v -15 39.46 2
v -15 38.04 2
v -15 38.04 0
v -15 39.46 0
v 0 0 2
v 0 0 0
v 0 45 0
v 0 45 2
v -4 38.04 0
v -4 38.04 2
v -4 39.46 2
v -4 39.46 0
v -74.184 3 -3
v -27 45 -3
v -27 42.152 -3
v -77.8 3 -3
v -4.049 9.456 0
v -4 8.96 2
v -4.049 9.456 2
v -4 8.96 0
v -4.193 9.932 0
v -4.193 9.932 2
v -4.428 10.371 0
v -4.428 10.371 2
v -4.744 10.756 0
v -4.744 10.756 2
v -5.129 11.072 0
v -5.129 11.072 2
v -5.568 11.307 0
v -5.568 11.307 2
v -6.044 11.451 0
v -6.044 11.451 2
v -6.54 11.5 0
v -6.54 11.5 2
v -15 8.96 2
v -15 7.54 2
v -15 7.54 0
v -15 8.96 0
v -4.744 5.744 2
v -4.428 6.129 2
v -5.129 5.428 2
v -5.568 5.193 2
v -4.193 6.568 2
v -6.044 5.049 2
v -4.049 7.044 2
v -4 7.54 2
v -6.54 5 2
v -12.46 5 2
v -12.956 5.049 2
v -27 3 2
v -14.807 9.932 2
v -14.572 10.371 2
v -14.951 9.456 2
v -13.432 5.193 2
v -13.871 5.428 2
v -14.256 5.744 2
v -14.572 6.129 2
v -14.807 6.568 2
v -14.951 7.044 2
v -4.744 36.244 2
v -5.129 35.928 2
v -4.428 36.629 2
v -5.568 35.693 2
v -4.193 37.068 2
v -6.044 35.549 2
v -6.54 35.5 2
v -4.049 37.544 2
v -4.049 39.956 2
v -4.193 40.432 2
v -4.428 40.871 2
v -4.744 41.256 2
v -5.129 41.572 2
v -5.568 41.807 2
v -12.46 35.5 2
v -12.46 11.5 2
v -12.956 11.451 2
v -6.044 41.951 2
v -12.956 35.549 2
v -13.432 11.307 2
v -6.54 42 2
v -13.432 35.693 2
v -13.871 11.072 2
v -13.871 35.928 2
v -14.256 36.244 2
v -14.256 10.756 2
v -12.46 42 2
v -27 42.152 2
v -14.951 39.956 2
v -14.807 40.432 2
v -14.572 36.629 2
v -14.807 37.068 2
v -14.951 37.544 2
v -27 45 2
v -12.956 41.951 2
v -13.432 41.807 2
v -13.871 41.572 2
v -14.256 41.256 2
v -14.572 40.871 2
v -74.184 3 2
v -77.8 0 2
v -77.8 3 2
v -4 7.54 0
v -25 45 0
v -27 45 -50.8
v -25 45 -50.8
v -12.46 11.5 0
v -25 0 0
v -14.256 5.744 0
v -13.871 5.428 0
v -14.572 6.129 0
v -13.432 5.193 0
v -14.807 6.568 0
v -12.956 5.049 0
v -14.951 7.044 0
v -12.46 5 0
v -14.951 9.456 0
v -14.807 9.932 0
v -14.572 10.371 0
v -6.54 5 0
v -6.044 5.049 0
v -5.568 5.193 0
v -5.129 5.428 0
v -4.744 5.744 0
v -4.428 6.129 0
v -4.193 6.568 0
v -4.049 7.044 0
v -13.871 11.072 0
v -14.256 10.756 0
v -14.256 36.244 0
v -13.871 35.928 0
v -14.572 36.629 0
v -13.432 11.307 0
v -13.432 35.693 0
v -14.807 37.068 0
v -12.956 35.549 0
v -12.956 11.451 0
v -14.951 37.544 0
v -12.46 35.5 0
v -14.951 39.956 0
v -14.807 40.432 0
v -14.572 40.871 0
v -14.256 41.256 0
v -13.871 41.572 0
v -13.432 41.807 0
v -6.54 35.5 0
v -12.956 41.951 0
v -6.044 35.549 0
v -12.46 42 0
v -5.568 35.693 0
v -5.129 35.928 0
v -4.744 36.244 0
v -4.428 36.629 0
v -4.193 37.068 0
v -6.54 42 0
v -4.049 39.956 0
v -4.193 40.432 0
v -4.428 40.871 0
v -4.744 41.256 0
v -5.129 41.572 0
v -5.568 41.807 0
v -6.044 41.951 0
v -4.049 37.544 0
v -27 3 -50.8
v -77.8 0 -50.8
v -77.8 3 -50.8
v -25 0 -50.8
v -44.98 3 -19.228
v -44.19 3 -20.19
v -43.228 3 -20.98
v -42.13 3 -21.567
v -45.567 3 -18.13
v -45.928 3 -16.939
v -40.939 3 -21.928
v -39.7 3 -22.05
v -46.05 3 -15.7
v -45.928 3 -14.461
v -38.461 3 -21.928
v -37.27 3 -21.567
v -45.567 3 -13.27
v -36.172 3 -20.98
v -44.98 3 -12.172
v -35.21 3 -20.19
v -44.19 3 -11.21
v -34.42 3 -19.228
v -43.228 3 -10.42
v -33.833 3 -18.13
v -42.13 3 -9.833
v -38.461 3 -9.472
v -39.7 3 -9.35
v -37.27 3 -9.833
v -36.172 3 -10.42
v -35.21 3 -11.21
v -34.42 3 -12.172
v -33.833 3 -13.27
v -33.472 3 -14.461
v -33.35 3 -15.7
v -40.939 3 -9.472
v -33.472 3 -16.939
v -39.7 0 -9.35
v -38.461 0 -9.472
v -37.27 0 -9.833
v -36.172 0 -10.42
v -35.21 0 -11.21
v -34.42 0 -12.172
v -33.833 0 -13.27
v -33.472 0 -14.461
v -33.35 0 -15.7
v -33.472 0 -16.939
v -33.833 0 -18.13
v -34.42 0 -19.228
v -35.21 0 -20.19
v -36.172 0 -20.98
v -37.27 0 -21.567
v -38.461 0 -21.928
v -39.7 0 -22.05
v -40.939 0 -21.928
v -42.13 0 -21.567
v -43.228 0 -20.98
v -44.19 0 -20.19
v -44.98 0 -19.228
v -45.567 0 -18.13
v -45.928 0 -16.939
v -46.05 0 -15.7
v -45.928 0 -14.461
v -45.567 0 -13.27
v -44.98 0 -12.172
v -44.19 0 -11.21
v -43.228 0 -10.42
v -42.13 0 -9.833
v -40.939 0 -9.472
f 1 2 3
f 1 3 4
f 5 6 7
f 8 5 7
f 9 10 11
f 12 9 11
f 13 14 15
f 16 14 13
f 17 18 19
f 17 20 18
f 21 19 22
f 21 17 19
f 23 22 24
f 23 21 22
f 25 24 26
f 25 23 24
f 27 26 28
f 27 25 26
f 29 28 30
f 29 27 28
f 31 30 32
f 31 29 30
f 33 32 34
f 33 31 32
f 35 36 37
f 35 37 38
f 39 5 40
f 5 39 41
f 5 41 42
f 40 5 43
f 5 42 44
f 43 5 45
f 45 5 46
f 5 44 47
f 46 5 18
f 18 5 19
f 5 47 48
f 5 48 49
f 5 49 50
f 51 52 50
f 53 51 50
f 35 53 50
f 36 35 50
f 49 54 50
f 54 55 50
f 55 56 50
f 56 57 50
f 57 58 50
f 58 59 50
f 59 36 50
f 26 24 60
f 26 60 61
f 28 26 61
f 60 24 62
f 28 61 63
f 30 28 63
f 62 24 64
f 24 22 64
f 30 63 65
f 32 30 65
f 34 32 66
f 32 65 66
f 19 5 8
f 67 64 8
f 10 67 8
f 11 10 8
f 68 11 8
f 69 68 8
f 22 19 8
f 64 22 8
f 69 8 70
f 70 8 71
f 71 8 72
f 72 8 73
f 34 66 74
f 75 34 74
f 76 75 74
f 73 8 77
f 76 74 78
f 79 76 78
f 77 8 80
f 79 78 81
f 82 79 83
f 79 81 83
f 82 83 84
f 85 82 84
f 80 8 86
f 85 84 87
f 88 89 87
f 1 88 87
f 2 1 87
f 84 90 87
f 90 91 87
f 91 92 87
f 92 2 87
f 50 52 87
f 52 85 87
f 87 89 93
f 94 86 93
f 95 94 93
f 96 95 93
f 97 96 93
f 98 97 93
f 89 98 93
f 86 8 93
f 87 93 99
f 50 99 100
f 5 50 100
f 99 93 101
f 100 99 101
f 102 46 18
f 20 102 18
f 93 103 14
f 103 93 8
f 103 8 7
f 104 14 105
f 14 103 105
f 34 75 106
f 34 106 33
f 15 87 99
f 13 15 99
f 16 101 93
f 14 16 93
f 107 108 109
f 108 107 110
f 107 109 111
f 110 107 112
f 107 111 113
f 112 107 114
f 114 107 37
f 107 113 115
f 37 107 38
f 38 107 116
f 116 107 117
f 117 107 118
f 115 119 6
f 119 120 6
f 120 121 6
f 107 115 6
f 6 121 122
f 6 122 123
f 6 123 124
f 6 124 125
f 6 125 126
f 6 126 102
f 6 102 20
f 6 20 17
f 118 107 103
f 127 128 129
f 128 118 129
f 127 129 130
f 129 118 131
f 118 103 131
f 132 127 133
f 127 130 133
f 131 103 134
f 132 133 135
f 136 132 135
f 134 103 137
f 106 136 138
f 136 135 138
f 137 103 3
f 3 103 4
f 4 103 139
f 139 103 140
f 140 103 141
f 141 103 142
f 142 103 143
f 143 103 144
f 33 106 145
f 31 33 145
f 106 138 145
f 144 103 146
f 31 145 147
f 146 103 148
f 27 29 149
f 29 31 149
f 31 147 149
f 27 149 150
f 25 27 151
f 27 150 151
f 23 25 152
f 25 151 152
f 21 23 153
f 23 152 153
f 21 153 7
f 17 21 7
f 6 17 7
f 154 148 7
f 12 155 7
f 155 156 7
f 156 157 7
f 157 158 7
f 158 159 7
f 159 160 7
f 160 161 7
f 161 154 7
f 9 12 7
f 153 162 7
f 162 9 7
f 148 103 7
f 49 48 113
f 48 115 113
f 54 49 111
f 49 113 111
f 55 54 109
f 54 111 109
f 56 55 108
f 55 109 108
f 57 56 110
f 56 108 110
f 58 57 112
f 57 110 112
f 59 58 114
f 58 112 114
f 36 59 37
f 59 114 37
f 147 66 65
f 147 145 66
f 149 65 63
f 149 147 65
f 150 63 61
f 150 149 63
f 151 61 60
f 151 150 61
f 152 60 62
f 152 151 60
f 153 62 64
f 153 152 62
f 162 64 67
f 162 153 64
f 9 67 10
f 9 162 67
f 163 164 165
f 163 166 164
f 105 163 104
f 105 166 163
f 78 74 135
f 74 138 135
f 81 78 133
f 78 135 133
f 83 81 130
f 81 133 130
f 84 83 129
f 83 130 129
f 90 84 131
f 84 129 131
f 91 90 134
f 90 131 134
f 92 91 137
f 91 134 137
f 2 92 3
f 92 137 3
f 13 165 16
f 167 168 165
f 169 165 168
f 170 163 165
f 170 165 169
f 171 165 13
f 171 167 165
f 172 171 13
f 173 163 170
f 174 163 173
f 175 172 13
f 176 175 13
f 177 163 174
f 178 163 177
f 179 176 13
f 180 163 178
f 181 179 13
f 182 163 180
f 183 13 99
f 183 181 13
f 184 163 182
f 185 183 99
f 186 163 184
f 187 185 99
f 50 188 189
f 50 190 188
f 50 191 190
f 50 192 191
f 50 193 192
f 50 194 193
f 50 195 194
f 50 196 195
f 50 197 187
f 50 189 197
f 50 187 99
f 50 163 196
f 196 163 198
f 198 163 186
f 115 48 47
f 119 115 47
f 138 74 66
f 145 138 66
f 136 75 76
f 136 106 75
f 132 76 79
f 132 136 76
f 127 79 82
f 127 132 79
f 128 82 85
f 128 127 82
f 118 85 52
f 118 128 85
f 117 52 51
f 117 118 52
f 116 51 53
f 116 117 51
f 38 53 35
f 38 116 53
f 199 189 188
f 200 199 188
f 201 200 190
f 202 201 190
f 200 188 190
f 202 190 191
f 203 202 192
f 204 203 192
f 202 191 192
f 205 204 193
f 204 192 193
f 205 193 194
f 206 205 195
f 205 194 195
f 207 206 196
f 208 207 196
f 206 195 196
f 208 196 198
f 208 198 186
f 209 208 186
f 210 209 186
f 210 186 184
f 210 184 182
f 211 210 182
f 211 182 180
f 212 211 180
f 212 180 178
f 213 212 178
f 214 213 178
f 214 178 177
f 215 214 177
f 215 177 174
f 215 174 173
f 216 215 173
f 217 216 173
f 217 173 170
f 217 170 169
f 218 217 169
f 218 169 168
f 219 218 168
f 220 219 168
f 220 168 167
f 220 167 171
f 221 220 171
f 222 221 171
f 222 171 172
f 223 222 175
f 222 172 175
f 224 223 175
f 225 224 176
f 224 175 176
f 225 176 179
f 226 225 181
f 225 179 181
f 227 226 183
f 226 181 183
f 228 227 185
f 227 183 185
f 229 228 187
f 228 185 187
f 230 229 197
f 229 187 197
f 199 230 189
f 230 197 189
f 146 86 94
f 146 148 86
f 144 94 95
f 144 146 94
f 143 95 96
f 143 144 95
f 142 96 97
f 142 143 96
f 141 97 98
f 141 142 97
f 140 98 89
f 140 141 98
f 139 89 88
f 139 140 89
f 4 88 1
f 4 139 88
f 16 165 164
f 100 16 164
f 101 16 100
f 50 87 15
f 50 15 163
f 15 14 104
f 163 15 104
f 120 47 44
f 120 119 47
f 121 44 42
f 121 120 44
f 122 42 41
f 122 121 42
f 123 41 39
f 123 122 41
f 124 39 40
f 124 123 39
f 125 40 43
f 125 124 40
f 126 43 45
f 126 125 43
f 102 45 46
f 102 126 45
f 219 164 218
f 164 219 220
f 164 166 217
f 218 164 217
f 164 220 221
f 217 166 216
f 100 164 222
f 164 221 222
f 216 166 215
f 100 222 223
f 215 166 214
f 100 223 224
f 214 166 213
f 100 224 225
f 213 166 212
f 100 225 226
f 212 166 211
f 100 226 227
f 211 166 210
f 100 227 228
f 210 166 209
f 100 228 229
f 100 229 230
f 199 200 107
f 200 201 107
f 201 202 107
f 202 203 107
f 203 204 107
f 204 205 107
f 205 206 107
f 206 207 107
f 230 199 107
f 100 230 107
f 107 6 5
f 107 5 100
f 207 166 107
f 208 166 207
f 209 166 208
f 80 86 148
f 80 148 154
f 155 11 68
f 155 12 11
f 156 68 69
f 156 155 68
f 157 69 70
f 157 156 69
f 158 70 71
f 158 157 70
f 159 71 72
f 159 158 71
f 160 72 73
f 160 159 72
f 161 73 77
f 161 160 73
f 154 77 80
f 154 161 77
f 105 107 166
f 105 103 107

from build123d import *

# Parameters (mm, degrees)
SKETCH1_W           = 25
SKETCH1_H           = 45
BOSS_EXTRUDE1_DEPTH = 2
SKETCH2_W           = 11
SKETCH2_H           = 6.5
CUT_EXTRUDE1_DEPTH  = 19.78
FILLET1_R           = 2.54
BOSS_EXTRUDE2_DEPTH = 2
SKETCH4_W           = 52.8
SKETCH4_H           = 3
BOSS_EXTRUDE3_DEPTH = 50.8
BOSS_EXTRUDE4_DEPTH = 5
SKETCH7_R           = 6.35
CUT_EXTRUDE3_DEPTH  = 5


with BuildPart() as part:
    # Sketch1 → Boss-Extrude1 (new body)
    with BuildSketch(Plane.XY):
        with Locations((-12.5, 22.5)):
            Rectangle(SKETCH1_W, SKETCH1_H)
    extrude(amount=BOSS_EXTRUDE1_DEPTH)

    # Sketch2 → Cut-Extrude1 (cut)
    with BuildSketch(Plane.XY.offset(2)):
        with Locations((-9.5, 8.25)):
            Rectangle(SKETCH2_W, SKETCH2_H)
        with Locations((-9.5, 38.75)):
            Rectangle(SKETCH2_W, SKETCH2_H)
    extrude(amount=-CUT_EXTRUDE1_DEPTH, mode=Mode.SUBTRACT)

    # Fillet1
    fillet1_edges = [part.edges().sort_by_distance(p)[0] for p in [
        (-15, 11.5, 1),
        (-4, 11.5, 1),
        (-4, 5, 1),
        (-15, 5, 1),
        (-15, 42, 1),
        (-4, 42, 1),
        (-4, 35.5, 1),
        (-15, 35.5, 1),
    ]]
    fillet(fillet1_edges, radius=FILLET1_R)

    # Sketch3 → Boss-Extrude2 (add)
    with BuildSketch(Plane.ZY.offset(25)):
        Polygon((2, 0), (0, 0), (-50.8, 0), (-50.8, 45), (0, 45), (2, 45), align=None)
    extrude(amount=BOSS_EXTRUDE2_DEPTH)

    # Sketch4 → Boss-Extrude3 (add)
    with BuildSketch(Plane.ZY.offset(27)):
        with Locations((-24.4, 1.5)):
            Rectangle(SKETCH4_W, SKETCH4_H)
    extrude(amount=BOSS_EXTRUDE3_DEPTH)

    # Sketch5 → Boss-Extrude4 (add)
    with BuildSketch(Plane.XY.offset(2)):
        Polygon((-77.8, 3), (-27, 45), (-27, 42.151802073), (-77.8, 0), align=None)
    extrude(amount=-BOSS_EXTRUDE4_DEPTH)

    # Sketch7 → Cut-Extrude3 (cut)
    with BuildSketch(Plane(origin=(0, 3, 0), x_dir=(1, 0, 0), z_dir=(0, 1, 0))):
        with Locations(Location((-39.7, 15.7, 0), (0, 0, 270))):
            Circle(SKETCH7_R)
    extrude(amount=-CUT_EXTRUDE3_DEPTH, mode=Mode.SUBTRACT)


solid = part.part
